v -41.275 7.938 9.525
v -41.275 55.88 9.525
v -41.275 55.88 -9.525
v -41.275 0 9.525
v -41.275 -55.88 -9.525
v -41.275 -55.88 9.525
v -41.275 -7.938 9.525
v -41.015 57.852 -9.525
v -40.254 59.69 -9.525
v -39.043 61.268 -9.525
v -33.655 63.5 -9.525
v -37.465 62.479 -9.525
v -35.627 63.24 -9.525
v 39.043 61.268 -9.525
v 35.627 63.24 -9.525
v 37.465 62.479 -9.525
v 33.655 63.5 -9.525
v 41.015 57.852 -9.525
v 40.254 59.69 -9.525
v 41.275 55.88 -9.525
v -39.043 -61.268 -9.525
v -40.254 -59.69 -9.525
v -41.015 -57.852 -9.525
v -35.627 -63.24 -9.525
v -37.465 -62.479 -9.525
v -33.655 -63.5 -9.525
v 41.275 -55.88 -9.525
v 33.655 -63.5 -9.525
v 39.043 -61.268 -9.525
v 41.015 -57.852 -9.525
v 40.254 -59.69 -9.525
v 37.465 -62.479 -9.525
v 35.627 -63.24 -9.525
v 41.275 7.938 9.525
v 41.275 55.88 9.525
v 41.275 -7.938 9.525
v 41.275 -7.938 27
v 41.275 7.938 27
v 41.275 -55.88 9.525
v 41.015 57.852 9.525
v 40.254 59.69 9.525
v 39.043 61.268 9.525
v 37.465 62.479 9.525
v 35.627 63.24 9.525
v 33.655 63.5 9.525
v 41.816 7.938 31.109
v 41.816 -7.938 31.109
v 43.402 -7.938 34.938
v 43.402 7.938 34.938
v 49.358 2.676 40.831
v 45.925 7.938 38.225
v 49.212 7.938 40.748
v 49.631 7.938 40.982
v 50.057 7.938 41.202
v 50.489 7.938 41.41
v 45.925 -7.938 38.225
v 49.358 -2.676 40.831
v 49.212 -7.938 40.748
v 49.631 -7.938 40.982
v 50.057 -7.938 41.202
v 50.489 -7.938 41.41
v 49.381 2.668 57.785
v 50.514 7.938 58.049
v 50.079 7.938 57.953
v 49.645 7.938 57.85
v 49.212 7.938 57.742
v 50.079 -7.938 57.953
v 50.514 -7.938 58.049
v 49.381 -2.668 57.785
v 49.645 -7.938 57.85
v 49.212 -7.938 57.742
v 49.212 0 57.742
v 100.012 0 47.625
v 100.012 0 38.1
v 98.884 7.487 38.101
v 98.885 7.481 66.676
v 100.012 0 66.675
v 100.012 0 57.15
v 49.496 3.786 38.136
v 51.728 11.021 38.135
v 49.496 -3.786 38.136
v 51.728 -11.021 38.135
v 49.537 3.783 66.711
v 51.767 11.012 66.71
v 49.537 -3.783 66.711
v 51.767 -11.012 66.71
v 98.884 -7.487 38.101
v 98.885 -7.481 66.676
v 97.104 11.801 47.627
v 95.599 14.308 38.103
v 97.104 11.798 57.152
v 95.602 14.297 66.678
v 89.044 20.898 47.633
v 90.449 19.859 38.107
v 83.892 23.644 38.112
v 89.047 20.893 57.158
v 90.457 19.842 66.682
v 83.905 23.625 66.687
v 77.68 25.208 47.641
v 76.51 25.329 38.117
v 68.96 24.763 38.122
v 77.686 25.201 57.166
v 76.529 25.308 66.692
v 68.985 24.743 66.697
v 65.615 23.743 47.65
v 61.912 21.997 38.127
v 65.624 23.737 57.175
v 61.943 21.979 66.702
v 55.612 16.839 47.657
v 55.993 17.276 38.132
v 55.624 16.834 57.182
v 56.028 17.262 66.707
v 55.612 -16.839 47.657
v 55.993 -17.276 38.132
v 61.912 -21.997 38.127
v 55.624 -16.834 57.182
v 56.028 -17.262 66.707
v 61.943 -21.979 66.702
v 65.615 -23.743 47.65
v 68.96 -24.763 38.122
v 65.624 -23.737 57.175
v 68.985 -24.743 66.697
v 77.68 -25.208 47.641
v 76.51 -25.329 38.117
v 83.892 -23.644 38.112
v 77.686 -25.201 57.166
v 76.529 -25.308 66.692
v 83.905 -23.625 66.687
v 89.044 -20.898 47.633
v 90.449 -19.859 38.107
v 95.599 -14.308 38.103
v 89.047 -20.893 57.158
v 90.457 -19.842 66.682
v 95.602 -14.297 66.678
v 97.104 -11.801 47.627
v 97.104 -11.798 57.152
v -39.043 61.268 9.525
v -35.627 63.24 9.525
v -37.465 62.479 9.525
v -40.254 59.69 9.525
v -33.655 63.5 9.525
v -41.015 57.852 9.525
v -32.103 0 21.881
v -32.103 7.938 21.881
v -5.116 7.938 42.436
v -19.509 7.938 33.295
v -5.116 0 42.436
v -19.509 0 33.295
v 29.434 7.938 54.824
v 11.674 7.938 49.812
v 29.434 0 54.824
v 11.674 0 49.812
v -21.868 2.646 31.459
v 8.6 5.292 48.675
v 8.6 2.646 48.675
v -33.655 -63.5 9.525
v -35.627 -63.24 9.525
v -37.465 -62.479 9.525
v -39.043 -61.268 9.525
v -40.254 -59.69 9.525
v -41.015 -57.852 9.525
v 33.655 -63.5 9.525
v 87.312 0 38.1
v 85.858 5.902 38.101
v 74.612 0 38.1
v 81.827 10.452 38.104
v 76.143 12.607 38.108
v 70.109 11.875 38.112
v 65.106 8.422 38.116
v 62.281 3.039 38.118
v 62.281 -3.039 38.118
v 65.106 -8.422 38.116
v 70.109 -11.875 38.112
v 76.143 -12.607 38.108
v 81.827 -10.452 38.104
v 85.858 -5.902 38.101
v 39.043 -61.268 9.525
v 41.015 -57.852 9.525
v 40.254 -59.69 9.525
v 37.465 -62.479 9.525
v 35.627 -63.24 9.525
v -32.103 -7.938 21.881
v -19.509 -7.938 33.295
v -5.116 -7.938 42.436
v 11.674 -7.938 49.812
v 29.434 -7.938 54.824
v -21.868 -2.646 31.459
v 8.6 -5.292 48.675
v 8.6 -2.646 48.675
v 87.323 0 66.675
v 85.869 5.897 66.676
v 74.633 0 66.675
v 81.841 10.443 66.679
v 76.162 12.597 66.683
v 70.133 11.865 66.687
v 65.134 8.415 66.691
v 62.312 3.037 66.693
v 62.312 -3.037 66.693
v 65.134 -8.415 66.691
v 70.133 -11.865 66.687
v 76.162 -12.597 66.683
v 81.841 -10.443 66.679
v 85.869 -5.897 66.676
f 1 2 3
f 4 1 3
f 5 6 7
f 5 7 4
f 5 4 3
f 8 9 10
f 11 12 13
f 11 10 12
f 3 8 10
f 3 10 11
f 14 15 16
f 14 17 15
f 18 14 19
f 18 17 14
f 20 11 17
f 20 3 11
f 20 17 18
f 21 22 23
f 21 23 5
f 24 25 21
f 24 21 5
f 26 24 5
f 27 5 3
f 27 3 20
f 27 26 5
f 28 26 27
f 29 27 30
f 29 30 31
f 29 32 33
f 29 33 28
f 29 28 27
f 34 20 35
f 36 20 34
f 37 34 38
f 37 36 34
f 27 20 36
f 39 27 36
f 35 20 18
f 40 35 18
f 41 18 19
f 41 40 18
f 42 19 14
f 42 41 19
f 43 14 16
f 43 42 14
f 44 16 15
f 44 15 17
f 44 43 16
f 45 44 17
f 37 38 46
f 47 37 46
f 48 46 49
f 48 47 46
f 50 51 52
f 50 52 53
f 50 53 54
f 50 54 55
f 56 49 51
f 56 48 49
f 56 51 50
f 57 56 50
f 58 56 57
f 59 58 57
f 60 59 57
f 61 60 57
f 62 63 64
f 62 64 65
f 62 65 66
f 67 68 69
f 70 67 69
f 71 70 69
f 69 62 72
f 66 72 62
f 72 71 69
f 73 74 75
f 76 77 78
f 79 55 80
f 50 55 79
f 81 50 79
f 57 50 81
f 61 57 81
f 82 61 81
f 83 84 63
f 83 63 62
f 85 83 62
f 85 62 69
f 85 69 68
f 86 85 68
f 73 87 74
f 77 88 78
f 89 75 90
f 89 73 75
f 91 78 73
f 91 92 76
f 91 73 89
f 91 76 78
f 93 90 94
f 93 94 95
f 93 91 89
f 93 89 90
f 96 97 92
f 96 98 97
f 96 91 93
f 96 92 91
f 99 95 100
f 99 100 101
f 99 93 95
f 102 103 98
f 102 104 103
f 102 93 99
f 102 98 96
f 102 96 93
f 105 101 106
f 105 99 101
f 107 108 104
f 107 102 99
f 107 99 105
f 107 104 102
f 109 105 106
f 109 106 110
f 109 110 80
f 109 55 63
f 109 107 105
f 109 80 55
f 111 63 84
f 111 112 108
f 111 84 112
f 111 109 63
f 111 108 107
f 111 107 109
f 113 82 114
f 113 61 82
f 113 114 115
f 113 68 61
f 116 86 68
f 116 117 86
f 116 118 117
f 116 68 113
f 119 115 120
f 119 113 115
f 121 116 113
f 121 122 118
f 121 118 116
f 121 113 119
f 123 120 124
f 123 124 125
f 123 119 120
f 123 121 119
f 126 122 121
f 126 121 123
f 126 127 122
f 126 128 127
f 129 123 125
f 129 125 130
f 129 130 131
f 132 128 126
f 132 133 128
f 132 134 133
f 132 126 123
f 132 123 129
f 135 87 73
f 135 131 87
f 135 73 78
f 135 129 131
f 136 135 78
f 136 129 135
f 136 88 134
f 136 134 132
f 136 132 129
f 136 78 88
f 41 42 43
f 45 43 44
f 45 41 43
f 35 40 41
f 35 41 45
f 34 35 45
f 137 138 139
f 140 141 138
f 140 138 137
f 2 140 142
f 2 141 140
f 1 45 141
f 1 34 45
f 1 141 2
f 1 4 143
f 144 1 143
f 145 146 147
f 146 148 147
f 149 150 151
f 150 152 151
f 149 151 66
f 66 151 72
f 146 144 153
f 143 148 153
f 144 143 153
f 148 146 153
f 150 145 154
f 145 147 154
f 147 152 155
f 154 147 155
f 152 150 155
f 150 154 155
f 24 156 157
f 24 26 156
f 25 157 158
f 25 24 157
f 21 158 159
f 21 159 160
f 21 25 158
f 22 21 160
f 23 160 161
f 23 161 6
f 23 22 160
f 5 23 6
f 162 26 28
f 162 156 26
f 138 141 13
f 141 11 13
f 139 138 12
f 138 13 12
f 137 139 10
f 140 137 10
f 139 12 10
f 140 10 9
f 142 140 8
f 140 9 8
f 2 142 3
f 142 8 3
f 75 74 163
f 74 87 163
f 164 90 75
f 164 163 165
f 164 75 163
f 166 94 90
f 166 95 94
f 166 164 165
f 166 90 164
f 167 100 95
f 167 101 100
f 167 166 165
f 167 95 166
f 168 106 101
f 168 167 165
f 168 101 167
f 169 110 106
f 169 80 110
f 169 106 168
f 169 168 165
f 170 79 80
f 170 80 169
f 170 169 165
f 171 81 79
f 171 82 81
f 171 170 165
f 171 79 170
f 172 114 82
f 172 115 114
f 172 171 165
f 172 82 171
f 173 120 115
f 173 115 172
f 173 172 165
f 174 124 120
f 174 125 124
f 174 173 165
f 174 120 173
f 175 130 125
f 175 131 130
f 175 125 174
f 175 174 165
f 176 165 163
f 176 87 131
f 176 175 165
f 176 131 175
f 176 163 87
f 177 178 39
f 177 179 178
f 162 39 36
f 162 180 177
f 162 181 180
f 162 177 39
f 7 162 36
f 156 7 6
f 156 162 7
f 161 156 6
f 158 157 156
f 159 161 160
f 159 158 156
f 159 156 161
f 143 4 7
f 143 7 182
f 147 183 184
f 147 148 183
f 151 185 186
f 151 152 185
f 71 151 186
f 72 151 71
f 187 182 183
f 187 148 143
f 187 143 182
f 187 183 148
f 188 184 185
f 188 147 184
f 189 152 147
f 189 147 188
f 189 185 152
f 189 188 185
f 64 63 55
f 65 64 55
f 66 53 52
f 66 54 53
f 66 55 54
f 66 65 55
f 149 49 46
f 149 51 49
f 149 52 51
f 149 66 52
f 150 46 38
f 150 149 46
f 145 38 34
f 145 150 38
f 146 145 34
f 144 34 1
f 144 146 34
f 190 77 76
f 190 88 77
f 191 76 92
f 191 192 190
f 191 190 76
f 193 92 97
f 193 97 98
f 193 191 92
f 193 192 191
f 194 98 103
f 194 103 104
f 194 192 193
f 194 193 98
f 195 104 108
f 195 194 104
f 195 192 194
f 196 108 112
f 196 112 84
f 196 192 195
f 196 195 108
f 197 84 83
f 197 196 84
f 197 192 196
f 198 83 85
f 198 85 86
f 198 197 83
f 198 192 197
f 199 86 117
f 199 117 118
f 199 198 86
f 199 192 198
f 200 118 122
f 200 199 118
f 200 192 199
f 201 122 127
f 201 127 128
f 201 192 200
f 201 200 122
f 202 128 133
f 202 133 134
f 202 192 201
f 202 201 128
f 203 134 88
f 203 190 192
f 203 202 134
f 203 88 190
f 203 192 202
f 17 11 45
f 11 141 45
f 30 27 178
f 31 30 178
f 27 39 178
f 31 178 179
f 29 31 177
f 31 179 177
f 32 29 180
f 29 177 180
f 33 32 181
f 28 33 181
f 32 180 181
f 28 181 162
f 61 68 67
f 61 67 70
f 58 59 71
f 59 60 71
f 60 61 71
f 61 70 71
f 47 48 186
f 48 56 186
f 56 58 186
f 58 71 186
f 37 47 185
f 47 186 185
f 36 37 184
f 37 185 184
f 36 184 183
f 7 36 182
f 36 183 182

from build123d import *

# Parameters (mm, degrees)
F1_DEPTH = 63.5
F2_DEPTH = 7.9375
F4_R     = 7.62


with BuildPart() as f1:
    # F0 (on Front) → F1 (new body, symmetric)
    with BuildSketch(Plane.XZ):
        Polygon((-41.275, -9.525), (41.275, -9.525), (41.275, 9.525), (25.4, 9.525), (-41.275, 9.525), align=None)
    extrude(amount=F1_DEPTH, both=True)

    # F0 (on Front) → F2 (join, symmetric)
    with BuildSketch(Plane.XZ):
        with BuildLine():
            add(Edge.make_bspline(
                [(-41.275, 9.525), (-27.703339234, 32.6747409999), (3.8328881679, 53.8919653869), (49.2122638223, 57.7419443287)],
                knots=[0, 0, 0, 0, 102.5320371125, 102.5320371125, 102.5320371125, 102.5320371125], degree=3))
            Line((-41.275, 9.525), (25.4, 9.525))
            Line((25.4, 9.525), (25.4, 27.0002))
            ThreePointArc((25.4, 27.0002), (32.0493463866, 46.4429284139), (49.2122638223, 57.7419443287))
        make_face()
        with BuildLine():
            Line((25.4, 9.525), (41.275, 9.525))
            Line((41.275, 9.525), (41.275, 27.0002))
            ThreePointArc((41.275, 27.0002), (43.4017785364, 34.9375819102), (49.2122638223, 40.7482169251))
            Line((49.2122638223, 40.7482169251), (49.2122638223, 57.7419443287))
            ThreePointArc((49.2122638223, 57.7419443287), (32.0493463866, 46.4429284139), (25.4, 27.0002))
            Line((25.4, 27.0002), (25.4, 9.525))
        make_face()
        with BuildLine():
            ThreePointArc((57.15, 58.7502), (53.149242724, 58.4971274885), (49.2122638223, 57.7419443287))
            Line((49.2122638223, 57.7419443287), (49.2122638223, 40.7482169251))
            ThreePointArc((49.2122638223, 40.7482169251), (53.0411159475, 42.3342371997), (57.15, 42.8752))
            Line((57.15, 42.8752), (74.6156958322, 42.8752))
            Line((74.6156958322, 42.8752), (74.6271054395, 58.7502))
            Line((74.6271054395, 58.7502), (57.15, 58.7502))
        make_face()
    extrude(amount=F2_DEPTH, both=True)

    # F0 (on Front) → F3 (revolve)
    with BuildSketch(Plane.XZ):
        Polygon((100.0122638223, 66.675), (74.6328011155, 66.675), (74.6271054395, 58.7502), (74.6156958322, 42.8752), (74.6122638223, 38.1), (100.0122638223, 38.1), align=None)
    revolve(axis=Axis((74.6225324689, 0, 52.3875), (0.0007187152, 0, 0.9999997417)))

    # F4
    f4_edges = [f1.edges().sort_by_distance(p)[0] for p in [
        (41.275, -63.5, 0),
        (-41.275, -63.5, 0),
        (41.275, 63.5, 0),
        (-41.275, 63.5, 0),
    ]]
    fillet(f4_edges, radius=F4_R)


solid = f1.part
